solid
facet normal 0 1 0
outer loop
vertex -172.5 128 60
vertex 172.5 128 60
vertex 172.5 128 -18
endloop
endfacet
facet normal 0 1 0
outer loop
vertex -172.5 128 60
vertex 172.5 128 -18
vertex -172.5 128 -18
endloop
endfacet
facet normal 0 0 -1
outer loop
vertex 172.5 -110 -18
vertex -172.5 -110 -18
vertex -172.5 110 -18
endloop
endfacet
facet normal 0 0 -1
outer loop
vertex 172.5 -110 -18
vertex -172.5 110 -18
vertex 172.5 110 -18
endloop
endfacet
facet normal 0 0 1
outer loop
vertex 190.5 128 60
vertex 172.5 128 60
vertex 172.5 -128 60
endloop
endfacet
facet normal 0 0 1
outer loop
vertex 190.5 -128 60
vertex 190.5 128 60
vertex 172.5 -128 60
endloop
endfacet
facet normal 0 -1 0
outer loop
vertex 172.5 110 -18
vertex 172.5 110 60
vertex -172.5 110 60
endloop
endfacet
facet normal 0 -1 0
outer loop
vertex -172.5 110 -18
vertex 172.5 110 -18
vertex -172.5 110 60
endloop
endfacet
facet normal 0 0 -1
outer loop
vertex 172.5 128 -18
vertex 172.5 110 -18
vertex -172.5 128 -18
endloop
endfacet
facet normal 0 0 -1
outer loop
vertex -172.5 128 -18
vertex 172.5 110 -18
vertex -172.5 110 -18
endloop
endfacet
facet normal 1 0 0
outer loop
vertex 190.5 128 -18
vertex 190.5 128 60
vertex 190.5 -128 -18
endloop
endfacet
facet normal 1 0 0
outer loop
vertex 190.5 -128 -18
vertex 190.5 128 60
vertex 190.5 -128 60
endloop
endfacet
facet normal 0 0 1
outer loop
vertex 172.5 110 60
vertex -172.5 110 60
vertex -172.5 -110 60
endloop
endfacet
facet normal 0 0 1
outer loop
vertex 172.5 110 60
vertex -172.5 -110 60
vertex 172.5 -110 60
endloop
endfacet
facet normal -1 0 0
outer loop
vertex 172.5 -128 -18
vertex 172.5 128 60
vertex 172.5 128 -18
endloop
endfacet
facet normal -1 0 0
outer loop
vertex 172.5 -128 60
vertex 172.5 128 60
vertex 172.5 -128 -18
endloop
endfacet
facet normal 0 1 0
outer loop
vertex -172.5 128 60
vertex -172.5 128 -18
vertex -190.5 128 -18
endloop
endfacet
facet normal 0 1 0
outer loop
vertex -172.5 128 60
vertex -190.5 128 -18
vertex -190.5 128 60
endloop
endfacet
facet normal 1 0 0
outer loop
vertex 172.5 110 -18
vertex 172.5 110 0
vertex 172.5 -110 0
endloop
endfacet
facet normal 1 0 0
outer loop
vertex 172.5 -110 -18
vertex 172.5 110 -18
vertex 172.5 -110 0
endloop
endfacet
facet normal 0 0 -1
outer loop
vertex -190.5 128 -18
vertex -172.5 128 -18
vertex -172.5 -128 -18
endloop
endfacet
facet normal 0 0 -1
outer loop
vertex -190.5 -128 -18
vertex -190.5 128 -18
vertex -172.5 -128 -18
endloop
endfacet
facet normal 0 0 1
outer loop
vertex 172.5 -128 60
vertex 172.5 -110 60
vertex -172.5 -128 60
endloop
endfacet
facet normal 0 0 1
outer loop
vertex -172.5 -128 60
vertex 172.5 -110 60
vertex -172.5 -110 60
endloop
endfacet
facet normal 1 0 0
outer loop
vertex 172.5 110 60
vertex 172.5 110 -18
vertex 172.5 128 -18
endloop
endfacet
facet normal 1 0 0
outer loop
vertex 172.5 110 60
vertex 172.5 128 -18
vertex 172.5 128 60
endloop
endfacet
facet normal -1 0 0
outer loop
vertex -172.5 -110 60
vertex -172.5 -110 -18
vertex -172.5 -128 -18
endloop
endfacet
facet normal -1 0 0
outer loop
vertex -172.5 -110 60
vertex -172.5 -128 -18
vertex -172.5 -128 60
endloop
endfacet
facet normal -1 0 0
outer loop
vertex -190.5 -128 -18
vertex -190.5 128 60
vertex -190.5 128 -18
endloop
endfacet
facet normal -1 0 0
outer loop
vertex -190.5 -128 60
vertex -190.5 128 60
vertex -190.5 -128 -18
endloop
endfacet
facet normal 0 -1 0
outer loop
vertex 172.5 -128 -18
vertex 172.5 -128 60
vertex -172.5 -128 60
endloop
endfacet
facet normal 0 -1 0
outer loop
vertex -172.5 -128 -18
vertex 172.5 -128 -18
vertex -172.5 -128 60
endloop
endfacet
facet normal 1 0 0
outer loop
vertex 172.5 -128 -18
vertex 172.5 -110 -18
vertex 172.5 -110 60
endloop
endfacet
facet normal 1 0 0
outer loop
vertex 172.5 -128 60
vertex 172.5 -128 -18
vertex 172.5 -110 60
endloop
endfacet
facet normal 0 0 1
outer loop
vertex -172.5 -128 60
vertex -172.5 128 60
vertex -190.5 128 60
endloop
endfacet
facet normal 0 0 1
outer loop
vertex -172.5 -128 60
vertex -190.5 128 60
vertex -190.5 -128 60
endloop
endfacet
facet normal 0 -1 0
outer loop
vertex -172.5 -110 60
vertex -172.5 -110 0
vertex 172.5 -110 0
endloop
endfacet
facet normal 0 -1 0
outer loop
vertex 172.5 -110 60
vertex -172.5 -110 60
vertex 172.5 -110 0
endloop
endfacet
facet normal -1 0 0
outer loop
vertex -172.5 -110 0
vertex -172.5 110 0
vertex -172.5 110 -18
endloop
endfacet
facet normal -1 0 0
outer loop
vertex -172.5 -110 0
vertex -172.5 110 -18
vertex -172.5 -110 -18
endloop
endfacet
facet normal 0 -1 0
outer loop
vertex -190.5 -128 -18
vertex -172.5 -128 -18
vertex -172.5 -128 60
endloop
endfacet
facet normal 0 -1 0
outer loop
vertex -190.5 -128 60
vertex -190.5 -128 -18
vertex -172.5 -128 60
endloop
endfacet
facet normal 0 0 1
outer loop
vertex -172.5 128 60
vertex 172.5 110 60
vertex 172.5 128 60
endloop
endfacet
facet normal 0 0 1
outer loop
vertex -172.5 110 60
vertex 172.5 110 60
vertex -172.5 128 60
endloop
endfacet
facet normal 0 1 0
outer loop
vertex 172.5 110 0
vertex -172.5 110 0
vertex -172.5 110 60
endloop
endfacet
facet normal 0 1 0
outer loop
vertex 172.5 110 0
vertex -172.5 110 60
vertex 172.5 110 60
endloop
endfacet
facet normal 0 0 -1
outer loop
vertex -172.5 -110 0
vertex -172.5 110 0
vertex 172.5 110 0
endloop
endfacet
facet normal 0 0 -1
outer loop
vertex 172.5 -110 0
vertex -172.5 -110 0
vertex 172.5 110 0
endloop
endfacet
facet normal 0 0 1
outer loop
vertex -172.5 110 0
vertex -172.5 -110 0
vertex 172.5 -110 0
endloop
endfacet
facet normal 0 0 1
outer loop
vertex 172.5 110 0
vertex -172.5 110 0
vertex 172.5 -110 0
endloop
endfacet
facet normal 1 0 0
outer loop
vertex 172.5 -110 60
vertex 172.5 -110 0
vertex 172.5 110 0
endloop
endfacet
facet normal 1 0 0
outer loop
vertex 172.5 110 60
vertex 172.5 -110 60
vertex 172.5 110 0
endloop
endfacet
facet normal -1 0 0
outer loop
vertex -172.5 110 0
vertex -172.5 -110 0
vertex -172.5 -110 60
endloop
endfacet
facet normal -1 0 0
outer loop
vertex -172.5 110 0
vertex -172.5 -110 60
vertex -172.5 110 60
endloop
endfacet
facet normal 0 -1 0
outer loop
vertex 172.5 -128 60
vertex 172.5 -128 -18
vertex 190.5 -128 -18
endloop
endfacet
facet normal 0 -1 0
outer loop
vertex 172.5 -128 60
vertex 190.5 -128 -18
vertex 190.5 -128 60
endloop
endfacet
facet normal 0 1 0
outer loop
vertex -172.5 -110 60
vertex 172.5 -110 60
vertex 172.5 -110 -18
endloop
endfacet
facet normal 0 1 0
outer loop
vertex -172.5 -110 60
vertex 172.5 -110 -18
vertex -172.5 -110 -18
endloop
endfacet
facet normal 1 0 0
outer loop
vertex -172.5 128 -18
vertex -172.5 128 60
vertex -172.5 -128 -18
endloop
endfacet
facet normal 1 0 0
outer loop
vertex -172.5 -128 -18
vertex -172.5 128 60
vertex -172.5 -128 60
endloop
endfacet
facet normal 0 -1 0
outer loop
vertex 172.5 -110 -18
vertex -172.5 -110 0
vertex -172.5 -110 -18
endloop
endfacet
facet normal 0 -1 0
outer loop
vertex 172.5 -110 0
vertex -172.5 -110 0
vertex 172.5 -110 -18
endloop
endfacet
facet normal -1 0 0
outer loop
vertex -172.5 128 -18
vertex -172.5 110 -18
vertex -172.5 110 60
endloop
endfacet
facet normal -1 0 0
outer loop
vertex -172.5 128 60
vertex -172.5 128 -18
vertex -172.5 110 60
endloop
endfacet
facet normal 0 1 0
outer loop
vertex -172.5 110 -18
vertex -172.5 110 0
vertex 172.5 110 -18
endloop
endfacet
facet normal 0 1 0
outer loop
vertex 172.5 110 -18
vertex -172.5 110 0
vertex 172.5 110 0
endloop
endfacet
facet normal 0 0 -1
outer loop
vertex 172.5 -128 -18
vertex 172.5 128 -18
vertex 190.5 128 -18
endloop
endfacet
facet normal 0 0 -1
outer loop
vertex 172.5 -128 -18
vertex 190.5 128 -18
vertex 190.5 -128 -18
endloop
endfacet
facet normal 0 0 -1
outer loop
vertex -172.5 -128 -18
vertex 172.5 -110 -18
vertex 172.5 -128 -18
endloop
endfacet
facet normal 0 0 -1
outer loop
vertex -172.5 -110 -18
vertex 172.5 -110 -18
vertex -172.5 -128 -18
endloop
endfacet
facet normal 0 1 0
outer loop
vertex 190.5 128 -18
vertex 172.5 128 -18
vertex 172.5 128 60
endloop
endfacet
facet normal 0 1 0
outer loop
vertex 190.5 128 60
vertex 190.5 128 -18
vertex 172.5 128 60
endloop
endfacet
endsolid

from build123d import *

# Parameters (mm, degrees)
F0_W     = 345
F0_H     = 220
F1_DEPTH = 60
F2_W     = 256
F2_H     = 78
F3_DEPTH = 18
F4_W     = 345
F4_H     = 78
F5_DEPTH = 18
F6_W     = 345
F6_H     = 220
F7_DEPTH = 18


with BuildPart() as f1:
    # F0 (on Top) → F1 (new body)
    with BuildSketch(Plane.XY):
        Rectangle(F0_W, F0_H)
    extrude(amount=F1_DEPTH)


with BuildPart() as f3:
    # F2 (on face) → F3 (new body)
    with BuildSketch(Plane(origin=(-172.5, 0, 0), x_dir=(0, -1, 0), z_dir=(-1, 0, 0))):
        with Locations((0, 21)):
            Rectangle(F2_W, F2_H)
    extrude(amount=F3_DEPTH)


with BuildPart() as f5:
    # F4 (on face) → F5 (new body)
    with BuildSketch(Plane(origin=(0, 110, 0), x_dir=(-1, 0, 0), z_dir=(0, 1, 0))):
        with Locations((0, 21)):
            Rectangle(F4_W, F4_H)
    extrude(amount=F5_DEPTH)


with BuildPart() as f7:
    # F6 (on face) → F7 (new body)
    with BuildSketch(Plane(origin=(0, 0, 0), x_dir=(1, 0, 0), z_dir=(0, 0, -1))):
        Rectangle(F6_W, F6_H)
    extrude(amount=F7_DEPTH)


with BuildPart() as f8_1:
    # F8: instance of F3
    add(f3.part.mirror(Plane.YZ))


with BuildPart() as f9_1:
    # F9: instance of F5
    add(f5.part.mirror(Plane.XZ))


solid = Compound([f1.part, f3.part, f5.part, f7.part, f8_1.part, f9_1.part])
